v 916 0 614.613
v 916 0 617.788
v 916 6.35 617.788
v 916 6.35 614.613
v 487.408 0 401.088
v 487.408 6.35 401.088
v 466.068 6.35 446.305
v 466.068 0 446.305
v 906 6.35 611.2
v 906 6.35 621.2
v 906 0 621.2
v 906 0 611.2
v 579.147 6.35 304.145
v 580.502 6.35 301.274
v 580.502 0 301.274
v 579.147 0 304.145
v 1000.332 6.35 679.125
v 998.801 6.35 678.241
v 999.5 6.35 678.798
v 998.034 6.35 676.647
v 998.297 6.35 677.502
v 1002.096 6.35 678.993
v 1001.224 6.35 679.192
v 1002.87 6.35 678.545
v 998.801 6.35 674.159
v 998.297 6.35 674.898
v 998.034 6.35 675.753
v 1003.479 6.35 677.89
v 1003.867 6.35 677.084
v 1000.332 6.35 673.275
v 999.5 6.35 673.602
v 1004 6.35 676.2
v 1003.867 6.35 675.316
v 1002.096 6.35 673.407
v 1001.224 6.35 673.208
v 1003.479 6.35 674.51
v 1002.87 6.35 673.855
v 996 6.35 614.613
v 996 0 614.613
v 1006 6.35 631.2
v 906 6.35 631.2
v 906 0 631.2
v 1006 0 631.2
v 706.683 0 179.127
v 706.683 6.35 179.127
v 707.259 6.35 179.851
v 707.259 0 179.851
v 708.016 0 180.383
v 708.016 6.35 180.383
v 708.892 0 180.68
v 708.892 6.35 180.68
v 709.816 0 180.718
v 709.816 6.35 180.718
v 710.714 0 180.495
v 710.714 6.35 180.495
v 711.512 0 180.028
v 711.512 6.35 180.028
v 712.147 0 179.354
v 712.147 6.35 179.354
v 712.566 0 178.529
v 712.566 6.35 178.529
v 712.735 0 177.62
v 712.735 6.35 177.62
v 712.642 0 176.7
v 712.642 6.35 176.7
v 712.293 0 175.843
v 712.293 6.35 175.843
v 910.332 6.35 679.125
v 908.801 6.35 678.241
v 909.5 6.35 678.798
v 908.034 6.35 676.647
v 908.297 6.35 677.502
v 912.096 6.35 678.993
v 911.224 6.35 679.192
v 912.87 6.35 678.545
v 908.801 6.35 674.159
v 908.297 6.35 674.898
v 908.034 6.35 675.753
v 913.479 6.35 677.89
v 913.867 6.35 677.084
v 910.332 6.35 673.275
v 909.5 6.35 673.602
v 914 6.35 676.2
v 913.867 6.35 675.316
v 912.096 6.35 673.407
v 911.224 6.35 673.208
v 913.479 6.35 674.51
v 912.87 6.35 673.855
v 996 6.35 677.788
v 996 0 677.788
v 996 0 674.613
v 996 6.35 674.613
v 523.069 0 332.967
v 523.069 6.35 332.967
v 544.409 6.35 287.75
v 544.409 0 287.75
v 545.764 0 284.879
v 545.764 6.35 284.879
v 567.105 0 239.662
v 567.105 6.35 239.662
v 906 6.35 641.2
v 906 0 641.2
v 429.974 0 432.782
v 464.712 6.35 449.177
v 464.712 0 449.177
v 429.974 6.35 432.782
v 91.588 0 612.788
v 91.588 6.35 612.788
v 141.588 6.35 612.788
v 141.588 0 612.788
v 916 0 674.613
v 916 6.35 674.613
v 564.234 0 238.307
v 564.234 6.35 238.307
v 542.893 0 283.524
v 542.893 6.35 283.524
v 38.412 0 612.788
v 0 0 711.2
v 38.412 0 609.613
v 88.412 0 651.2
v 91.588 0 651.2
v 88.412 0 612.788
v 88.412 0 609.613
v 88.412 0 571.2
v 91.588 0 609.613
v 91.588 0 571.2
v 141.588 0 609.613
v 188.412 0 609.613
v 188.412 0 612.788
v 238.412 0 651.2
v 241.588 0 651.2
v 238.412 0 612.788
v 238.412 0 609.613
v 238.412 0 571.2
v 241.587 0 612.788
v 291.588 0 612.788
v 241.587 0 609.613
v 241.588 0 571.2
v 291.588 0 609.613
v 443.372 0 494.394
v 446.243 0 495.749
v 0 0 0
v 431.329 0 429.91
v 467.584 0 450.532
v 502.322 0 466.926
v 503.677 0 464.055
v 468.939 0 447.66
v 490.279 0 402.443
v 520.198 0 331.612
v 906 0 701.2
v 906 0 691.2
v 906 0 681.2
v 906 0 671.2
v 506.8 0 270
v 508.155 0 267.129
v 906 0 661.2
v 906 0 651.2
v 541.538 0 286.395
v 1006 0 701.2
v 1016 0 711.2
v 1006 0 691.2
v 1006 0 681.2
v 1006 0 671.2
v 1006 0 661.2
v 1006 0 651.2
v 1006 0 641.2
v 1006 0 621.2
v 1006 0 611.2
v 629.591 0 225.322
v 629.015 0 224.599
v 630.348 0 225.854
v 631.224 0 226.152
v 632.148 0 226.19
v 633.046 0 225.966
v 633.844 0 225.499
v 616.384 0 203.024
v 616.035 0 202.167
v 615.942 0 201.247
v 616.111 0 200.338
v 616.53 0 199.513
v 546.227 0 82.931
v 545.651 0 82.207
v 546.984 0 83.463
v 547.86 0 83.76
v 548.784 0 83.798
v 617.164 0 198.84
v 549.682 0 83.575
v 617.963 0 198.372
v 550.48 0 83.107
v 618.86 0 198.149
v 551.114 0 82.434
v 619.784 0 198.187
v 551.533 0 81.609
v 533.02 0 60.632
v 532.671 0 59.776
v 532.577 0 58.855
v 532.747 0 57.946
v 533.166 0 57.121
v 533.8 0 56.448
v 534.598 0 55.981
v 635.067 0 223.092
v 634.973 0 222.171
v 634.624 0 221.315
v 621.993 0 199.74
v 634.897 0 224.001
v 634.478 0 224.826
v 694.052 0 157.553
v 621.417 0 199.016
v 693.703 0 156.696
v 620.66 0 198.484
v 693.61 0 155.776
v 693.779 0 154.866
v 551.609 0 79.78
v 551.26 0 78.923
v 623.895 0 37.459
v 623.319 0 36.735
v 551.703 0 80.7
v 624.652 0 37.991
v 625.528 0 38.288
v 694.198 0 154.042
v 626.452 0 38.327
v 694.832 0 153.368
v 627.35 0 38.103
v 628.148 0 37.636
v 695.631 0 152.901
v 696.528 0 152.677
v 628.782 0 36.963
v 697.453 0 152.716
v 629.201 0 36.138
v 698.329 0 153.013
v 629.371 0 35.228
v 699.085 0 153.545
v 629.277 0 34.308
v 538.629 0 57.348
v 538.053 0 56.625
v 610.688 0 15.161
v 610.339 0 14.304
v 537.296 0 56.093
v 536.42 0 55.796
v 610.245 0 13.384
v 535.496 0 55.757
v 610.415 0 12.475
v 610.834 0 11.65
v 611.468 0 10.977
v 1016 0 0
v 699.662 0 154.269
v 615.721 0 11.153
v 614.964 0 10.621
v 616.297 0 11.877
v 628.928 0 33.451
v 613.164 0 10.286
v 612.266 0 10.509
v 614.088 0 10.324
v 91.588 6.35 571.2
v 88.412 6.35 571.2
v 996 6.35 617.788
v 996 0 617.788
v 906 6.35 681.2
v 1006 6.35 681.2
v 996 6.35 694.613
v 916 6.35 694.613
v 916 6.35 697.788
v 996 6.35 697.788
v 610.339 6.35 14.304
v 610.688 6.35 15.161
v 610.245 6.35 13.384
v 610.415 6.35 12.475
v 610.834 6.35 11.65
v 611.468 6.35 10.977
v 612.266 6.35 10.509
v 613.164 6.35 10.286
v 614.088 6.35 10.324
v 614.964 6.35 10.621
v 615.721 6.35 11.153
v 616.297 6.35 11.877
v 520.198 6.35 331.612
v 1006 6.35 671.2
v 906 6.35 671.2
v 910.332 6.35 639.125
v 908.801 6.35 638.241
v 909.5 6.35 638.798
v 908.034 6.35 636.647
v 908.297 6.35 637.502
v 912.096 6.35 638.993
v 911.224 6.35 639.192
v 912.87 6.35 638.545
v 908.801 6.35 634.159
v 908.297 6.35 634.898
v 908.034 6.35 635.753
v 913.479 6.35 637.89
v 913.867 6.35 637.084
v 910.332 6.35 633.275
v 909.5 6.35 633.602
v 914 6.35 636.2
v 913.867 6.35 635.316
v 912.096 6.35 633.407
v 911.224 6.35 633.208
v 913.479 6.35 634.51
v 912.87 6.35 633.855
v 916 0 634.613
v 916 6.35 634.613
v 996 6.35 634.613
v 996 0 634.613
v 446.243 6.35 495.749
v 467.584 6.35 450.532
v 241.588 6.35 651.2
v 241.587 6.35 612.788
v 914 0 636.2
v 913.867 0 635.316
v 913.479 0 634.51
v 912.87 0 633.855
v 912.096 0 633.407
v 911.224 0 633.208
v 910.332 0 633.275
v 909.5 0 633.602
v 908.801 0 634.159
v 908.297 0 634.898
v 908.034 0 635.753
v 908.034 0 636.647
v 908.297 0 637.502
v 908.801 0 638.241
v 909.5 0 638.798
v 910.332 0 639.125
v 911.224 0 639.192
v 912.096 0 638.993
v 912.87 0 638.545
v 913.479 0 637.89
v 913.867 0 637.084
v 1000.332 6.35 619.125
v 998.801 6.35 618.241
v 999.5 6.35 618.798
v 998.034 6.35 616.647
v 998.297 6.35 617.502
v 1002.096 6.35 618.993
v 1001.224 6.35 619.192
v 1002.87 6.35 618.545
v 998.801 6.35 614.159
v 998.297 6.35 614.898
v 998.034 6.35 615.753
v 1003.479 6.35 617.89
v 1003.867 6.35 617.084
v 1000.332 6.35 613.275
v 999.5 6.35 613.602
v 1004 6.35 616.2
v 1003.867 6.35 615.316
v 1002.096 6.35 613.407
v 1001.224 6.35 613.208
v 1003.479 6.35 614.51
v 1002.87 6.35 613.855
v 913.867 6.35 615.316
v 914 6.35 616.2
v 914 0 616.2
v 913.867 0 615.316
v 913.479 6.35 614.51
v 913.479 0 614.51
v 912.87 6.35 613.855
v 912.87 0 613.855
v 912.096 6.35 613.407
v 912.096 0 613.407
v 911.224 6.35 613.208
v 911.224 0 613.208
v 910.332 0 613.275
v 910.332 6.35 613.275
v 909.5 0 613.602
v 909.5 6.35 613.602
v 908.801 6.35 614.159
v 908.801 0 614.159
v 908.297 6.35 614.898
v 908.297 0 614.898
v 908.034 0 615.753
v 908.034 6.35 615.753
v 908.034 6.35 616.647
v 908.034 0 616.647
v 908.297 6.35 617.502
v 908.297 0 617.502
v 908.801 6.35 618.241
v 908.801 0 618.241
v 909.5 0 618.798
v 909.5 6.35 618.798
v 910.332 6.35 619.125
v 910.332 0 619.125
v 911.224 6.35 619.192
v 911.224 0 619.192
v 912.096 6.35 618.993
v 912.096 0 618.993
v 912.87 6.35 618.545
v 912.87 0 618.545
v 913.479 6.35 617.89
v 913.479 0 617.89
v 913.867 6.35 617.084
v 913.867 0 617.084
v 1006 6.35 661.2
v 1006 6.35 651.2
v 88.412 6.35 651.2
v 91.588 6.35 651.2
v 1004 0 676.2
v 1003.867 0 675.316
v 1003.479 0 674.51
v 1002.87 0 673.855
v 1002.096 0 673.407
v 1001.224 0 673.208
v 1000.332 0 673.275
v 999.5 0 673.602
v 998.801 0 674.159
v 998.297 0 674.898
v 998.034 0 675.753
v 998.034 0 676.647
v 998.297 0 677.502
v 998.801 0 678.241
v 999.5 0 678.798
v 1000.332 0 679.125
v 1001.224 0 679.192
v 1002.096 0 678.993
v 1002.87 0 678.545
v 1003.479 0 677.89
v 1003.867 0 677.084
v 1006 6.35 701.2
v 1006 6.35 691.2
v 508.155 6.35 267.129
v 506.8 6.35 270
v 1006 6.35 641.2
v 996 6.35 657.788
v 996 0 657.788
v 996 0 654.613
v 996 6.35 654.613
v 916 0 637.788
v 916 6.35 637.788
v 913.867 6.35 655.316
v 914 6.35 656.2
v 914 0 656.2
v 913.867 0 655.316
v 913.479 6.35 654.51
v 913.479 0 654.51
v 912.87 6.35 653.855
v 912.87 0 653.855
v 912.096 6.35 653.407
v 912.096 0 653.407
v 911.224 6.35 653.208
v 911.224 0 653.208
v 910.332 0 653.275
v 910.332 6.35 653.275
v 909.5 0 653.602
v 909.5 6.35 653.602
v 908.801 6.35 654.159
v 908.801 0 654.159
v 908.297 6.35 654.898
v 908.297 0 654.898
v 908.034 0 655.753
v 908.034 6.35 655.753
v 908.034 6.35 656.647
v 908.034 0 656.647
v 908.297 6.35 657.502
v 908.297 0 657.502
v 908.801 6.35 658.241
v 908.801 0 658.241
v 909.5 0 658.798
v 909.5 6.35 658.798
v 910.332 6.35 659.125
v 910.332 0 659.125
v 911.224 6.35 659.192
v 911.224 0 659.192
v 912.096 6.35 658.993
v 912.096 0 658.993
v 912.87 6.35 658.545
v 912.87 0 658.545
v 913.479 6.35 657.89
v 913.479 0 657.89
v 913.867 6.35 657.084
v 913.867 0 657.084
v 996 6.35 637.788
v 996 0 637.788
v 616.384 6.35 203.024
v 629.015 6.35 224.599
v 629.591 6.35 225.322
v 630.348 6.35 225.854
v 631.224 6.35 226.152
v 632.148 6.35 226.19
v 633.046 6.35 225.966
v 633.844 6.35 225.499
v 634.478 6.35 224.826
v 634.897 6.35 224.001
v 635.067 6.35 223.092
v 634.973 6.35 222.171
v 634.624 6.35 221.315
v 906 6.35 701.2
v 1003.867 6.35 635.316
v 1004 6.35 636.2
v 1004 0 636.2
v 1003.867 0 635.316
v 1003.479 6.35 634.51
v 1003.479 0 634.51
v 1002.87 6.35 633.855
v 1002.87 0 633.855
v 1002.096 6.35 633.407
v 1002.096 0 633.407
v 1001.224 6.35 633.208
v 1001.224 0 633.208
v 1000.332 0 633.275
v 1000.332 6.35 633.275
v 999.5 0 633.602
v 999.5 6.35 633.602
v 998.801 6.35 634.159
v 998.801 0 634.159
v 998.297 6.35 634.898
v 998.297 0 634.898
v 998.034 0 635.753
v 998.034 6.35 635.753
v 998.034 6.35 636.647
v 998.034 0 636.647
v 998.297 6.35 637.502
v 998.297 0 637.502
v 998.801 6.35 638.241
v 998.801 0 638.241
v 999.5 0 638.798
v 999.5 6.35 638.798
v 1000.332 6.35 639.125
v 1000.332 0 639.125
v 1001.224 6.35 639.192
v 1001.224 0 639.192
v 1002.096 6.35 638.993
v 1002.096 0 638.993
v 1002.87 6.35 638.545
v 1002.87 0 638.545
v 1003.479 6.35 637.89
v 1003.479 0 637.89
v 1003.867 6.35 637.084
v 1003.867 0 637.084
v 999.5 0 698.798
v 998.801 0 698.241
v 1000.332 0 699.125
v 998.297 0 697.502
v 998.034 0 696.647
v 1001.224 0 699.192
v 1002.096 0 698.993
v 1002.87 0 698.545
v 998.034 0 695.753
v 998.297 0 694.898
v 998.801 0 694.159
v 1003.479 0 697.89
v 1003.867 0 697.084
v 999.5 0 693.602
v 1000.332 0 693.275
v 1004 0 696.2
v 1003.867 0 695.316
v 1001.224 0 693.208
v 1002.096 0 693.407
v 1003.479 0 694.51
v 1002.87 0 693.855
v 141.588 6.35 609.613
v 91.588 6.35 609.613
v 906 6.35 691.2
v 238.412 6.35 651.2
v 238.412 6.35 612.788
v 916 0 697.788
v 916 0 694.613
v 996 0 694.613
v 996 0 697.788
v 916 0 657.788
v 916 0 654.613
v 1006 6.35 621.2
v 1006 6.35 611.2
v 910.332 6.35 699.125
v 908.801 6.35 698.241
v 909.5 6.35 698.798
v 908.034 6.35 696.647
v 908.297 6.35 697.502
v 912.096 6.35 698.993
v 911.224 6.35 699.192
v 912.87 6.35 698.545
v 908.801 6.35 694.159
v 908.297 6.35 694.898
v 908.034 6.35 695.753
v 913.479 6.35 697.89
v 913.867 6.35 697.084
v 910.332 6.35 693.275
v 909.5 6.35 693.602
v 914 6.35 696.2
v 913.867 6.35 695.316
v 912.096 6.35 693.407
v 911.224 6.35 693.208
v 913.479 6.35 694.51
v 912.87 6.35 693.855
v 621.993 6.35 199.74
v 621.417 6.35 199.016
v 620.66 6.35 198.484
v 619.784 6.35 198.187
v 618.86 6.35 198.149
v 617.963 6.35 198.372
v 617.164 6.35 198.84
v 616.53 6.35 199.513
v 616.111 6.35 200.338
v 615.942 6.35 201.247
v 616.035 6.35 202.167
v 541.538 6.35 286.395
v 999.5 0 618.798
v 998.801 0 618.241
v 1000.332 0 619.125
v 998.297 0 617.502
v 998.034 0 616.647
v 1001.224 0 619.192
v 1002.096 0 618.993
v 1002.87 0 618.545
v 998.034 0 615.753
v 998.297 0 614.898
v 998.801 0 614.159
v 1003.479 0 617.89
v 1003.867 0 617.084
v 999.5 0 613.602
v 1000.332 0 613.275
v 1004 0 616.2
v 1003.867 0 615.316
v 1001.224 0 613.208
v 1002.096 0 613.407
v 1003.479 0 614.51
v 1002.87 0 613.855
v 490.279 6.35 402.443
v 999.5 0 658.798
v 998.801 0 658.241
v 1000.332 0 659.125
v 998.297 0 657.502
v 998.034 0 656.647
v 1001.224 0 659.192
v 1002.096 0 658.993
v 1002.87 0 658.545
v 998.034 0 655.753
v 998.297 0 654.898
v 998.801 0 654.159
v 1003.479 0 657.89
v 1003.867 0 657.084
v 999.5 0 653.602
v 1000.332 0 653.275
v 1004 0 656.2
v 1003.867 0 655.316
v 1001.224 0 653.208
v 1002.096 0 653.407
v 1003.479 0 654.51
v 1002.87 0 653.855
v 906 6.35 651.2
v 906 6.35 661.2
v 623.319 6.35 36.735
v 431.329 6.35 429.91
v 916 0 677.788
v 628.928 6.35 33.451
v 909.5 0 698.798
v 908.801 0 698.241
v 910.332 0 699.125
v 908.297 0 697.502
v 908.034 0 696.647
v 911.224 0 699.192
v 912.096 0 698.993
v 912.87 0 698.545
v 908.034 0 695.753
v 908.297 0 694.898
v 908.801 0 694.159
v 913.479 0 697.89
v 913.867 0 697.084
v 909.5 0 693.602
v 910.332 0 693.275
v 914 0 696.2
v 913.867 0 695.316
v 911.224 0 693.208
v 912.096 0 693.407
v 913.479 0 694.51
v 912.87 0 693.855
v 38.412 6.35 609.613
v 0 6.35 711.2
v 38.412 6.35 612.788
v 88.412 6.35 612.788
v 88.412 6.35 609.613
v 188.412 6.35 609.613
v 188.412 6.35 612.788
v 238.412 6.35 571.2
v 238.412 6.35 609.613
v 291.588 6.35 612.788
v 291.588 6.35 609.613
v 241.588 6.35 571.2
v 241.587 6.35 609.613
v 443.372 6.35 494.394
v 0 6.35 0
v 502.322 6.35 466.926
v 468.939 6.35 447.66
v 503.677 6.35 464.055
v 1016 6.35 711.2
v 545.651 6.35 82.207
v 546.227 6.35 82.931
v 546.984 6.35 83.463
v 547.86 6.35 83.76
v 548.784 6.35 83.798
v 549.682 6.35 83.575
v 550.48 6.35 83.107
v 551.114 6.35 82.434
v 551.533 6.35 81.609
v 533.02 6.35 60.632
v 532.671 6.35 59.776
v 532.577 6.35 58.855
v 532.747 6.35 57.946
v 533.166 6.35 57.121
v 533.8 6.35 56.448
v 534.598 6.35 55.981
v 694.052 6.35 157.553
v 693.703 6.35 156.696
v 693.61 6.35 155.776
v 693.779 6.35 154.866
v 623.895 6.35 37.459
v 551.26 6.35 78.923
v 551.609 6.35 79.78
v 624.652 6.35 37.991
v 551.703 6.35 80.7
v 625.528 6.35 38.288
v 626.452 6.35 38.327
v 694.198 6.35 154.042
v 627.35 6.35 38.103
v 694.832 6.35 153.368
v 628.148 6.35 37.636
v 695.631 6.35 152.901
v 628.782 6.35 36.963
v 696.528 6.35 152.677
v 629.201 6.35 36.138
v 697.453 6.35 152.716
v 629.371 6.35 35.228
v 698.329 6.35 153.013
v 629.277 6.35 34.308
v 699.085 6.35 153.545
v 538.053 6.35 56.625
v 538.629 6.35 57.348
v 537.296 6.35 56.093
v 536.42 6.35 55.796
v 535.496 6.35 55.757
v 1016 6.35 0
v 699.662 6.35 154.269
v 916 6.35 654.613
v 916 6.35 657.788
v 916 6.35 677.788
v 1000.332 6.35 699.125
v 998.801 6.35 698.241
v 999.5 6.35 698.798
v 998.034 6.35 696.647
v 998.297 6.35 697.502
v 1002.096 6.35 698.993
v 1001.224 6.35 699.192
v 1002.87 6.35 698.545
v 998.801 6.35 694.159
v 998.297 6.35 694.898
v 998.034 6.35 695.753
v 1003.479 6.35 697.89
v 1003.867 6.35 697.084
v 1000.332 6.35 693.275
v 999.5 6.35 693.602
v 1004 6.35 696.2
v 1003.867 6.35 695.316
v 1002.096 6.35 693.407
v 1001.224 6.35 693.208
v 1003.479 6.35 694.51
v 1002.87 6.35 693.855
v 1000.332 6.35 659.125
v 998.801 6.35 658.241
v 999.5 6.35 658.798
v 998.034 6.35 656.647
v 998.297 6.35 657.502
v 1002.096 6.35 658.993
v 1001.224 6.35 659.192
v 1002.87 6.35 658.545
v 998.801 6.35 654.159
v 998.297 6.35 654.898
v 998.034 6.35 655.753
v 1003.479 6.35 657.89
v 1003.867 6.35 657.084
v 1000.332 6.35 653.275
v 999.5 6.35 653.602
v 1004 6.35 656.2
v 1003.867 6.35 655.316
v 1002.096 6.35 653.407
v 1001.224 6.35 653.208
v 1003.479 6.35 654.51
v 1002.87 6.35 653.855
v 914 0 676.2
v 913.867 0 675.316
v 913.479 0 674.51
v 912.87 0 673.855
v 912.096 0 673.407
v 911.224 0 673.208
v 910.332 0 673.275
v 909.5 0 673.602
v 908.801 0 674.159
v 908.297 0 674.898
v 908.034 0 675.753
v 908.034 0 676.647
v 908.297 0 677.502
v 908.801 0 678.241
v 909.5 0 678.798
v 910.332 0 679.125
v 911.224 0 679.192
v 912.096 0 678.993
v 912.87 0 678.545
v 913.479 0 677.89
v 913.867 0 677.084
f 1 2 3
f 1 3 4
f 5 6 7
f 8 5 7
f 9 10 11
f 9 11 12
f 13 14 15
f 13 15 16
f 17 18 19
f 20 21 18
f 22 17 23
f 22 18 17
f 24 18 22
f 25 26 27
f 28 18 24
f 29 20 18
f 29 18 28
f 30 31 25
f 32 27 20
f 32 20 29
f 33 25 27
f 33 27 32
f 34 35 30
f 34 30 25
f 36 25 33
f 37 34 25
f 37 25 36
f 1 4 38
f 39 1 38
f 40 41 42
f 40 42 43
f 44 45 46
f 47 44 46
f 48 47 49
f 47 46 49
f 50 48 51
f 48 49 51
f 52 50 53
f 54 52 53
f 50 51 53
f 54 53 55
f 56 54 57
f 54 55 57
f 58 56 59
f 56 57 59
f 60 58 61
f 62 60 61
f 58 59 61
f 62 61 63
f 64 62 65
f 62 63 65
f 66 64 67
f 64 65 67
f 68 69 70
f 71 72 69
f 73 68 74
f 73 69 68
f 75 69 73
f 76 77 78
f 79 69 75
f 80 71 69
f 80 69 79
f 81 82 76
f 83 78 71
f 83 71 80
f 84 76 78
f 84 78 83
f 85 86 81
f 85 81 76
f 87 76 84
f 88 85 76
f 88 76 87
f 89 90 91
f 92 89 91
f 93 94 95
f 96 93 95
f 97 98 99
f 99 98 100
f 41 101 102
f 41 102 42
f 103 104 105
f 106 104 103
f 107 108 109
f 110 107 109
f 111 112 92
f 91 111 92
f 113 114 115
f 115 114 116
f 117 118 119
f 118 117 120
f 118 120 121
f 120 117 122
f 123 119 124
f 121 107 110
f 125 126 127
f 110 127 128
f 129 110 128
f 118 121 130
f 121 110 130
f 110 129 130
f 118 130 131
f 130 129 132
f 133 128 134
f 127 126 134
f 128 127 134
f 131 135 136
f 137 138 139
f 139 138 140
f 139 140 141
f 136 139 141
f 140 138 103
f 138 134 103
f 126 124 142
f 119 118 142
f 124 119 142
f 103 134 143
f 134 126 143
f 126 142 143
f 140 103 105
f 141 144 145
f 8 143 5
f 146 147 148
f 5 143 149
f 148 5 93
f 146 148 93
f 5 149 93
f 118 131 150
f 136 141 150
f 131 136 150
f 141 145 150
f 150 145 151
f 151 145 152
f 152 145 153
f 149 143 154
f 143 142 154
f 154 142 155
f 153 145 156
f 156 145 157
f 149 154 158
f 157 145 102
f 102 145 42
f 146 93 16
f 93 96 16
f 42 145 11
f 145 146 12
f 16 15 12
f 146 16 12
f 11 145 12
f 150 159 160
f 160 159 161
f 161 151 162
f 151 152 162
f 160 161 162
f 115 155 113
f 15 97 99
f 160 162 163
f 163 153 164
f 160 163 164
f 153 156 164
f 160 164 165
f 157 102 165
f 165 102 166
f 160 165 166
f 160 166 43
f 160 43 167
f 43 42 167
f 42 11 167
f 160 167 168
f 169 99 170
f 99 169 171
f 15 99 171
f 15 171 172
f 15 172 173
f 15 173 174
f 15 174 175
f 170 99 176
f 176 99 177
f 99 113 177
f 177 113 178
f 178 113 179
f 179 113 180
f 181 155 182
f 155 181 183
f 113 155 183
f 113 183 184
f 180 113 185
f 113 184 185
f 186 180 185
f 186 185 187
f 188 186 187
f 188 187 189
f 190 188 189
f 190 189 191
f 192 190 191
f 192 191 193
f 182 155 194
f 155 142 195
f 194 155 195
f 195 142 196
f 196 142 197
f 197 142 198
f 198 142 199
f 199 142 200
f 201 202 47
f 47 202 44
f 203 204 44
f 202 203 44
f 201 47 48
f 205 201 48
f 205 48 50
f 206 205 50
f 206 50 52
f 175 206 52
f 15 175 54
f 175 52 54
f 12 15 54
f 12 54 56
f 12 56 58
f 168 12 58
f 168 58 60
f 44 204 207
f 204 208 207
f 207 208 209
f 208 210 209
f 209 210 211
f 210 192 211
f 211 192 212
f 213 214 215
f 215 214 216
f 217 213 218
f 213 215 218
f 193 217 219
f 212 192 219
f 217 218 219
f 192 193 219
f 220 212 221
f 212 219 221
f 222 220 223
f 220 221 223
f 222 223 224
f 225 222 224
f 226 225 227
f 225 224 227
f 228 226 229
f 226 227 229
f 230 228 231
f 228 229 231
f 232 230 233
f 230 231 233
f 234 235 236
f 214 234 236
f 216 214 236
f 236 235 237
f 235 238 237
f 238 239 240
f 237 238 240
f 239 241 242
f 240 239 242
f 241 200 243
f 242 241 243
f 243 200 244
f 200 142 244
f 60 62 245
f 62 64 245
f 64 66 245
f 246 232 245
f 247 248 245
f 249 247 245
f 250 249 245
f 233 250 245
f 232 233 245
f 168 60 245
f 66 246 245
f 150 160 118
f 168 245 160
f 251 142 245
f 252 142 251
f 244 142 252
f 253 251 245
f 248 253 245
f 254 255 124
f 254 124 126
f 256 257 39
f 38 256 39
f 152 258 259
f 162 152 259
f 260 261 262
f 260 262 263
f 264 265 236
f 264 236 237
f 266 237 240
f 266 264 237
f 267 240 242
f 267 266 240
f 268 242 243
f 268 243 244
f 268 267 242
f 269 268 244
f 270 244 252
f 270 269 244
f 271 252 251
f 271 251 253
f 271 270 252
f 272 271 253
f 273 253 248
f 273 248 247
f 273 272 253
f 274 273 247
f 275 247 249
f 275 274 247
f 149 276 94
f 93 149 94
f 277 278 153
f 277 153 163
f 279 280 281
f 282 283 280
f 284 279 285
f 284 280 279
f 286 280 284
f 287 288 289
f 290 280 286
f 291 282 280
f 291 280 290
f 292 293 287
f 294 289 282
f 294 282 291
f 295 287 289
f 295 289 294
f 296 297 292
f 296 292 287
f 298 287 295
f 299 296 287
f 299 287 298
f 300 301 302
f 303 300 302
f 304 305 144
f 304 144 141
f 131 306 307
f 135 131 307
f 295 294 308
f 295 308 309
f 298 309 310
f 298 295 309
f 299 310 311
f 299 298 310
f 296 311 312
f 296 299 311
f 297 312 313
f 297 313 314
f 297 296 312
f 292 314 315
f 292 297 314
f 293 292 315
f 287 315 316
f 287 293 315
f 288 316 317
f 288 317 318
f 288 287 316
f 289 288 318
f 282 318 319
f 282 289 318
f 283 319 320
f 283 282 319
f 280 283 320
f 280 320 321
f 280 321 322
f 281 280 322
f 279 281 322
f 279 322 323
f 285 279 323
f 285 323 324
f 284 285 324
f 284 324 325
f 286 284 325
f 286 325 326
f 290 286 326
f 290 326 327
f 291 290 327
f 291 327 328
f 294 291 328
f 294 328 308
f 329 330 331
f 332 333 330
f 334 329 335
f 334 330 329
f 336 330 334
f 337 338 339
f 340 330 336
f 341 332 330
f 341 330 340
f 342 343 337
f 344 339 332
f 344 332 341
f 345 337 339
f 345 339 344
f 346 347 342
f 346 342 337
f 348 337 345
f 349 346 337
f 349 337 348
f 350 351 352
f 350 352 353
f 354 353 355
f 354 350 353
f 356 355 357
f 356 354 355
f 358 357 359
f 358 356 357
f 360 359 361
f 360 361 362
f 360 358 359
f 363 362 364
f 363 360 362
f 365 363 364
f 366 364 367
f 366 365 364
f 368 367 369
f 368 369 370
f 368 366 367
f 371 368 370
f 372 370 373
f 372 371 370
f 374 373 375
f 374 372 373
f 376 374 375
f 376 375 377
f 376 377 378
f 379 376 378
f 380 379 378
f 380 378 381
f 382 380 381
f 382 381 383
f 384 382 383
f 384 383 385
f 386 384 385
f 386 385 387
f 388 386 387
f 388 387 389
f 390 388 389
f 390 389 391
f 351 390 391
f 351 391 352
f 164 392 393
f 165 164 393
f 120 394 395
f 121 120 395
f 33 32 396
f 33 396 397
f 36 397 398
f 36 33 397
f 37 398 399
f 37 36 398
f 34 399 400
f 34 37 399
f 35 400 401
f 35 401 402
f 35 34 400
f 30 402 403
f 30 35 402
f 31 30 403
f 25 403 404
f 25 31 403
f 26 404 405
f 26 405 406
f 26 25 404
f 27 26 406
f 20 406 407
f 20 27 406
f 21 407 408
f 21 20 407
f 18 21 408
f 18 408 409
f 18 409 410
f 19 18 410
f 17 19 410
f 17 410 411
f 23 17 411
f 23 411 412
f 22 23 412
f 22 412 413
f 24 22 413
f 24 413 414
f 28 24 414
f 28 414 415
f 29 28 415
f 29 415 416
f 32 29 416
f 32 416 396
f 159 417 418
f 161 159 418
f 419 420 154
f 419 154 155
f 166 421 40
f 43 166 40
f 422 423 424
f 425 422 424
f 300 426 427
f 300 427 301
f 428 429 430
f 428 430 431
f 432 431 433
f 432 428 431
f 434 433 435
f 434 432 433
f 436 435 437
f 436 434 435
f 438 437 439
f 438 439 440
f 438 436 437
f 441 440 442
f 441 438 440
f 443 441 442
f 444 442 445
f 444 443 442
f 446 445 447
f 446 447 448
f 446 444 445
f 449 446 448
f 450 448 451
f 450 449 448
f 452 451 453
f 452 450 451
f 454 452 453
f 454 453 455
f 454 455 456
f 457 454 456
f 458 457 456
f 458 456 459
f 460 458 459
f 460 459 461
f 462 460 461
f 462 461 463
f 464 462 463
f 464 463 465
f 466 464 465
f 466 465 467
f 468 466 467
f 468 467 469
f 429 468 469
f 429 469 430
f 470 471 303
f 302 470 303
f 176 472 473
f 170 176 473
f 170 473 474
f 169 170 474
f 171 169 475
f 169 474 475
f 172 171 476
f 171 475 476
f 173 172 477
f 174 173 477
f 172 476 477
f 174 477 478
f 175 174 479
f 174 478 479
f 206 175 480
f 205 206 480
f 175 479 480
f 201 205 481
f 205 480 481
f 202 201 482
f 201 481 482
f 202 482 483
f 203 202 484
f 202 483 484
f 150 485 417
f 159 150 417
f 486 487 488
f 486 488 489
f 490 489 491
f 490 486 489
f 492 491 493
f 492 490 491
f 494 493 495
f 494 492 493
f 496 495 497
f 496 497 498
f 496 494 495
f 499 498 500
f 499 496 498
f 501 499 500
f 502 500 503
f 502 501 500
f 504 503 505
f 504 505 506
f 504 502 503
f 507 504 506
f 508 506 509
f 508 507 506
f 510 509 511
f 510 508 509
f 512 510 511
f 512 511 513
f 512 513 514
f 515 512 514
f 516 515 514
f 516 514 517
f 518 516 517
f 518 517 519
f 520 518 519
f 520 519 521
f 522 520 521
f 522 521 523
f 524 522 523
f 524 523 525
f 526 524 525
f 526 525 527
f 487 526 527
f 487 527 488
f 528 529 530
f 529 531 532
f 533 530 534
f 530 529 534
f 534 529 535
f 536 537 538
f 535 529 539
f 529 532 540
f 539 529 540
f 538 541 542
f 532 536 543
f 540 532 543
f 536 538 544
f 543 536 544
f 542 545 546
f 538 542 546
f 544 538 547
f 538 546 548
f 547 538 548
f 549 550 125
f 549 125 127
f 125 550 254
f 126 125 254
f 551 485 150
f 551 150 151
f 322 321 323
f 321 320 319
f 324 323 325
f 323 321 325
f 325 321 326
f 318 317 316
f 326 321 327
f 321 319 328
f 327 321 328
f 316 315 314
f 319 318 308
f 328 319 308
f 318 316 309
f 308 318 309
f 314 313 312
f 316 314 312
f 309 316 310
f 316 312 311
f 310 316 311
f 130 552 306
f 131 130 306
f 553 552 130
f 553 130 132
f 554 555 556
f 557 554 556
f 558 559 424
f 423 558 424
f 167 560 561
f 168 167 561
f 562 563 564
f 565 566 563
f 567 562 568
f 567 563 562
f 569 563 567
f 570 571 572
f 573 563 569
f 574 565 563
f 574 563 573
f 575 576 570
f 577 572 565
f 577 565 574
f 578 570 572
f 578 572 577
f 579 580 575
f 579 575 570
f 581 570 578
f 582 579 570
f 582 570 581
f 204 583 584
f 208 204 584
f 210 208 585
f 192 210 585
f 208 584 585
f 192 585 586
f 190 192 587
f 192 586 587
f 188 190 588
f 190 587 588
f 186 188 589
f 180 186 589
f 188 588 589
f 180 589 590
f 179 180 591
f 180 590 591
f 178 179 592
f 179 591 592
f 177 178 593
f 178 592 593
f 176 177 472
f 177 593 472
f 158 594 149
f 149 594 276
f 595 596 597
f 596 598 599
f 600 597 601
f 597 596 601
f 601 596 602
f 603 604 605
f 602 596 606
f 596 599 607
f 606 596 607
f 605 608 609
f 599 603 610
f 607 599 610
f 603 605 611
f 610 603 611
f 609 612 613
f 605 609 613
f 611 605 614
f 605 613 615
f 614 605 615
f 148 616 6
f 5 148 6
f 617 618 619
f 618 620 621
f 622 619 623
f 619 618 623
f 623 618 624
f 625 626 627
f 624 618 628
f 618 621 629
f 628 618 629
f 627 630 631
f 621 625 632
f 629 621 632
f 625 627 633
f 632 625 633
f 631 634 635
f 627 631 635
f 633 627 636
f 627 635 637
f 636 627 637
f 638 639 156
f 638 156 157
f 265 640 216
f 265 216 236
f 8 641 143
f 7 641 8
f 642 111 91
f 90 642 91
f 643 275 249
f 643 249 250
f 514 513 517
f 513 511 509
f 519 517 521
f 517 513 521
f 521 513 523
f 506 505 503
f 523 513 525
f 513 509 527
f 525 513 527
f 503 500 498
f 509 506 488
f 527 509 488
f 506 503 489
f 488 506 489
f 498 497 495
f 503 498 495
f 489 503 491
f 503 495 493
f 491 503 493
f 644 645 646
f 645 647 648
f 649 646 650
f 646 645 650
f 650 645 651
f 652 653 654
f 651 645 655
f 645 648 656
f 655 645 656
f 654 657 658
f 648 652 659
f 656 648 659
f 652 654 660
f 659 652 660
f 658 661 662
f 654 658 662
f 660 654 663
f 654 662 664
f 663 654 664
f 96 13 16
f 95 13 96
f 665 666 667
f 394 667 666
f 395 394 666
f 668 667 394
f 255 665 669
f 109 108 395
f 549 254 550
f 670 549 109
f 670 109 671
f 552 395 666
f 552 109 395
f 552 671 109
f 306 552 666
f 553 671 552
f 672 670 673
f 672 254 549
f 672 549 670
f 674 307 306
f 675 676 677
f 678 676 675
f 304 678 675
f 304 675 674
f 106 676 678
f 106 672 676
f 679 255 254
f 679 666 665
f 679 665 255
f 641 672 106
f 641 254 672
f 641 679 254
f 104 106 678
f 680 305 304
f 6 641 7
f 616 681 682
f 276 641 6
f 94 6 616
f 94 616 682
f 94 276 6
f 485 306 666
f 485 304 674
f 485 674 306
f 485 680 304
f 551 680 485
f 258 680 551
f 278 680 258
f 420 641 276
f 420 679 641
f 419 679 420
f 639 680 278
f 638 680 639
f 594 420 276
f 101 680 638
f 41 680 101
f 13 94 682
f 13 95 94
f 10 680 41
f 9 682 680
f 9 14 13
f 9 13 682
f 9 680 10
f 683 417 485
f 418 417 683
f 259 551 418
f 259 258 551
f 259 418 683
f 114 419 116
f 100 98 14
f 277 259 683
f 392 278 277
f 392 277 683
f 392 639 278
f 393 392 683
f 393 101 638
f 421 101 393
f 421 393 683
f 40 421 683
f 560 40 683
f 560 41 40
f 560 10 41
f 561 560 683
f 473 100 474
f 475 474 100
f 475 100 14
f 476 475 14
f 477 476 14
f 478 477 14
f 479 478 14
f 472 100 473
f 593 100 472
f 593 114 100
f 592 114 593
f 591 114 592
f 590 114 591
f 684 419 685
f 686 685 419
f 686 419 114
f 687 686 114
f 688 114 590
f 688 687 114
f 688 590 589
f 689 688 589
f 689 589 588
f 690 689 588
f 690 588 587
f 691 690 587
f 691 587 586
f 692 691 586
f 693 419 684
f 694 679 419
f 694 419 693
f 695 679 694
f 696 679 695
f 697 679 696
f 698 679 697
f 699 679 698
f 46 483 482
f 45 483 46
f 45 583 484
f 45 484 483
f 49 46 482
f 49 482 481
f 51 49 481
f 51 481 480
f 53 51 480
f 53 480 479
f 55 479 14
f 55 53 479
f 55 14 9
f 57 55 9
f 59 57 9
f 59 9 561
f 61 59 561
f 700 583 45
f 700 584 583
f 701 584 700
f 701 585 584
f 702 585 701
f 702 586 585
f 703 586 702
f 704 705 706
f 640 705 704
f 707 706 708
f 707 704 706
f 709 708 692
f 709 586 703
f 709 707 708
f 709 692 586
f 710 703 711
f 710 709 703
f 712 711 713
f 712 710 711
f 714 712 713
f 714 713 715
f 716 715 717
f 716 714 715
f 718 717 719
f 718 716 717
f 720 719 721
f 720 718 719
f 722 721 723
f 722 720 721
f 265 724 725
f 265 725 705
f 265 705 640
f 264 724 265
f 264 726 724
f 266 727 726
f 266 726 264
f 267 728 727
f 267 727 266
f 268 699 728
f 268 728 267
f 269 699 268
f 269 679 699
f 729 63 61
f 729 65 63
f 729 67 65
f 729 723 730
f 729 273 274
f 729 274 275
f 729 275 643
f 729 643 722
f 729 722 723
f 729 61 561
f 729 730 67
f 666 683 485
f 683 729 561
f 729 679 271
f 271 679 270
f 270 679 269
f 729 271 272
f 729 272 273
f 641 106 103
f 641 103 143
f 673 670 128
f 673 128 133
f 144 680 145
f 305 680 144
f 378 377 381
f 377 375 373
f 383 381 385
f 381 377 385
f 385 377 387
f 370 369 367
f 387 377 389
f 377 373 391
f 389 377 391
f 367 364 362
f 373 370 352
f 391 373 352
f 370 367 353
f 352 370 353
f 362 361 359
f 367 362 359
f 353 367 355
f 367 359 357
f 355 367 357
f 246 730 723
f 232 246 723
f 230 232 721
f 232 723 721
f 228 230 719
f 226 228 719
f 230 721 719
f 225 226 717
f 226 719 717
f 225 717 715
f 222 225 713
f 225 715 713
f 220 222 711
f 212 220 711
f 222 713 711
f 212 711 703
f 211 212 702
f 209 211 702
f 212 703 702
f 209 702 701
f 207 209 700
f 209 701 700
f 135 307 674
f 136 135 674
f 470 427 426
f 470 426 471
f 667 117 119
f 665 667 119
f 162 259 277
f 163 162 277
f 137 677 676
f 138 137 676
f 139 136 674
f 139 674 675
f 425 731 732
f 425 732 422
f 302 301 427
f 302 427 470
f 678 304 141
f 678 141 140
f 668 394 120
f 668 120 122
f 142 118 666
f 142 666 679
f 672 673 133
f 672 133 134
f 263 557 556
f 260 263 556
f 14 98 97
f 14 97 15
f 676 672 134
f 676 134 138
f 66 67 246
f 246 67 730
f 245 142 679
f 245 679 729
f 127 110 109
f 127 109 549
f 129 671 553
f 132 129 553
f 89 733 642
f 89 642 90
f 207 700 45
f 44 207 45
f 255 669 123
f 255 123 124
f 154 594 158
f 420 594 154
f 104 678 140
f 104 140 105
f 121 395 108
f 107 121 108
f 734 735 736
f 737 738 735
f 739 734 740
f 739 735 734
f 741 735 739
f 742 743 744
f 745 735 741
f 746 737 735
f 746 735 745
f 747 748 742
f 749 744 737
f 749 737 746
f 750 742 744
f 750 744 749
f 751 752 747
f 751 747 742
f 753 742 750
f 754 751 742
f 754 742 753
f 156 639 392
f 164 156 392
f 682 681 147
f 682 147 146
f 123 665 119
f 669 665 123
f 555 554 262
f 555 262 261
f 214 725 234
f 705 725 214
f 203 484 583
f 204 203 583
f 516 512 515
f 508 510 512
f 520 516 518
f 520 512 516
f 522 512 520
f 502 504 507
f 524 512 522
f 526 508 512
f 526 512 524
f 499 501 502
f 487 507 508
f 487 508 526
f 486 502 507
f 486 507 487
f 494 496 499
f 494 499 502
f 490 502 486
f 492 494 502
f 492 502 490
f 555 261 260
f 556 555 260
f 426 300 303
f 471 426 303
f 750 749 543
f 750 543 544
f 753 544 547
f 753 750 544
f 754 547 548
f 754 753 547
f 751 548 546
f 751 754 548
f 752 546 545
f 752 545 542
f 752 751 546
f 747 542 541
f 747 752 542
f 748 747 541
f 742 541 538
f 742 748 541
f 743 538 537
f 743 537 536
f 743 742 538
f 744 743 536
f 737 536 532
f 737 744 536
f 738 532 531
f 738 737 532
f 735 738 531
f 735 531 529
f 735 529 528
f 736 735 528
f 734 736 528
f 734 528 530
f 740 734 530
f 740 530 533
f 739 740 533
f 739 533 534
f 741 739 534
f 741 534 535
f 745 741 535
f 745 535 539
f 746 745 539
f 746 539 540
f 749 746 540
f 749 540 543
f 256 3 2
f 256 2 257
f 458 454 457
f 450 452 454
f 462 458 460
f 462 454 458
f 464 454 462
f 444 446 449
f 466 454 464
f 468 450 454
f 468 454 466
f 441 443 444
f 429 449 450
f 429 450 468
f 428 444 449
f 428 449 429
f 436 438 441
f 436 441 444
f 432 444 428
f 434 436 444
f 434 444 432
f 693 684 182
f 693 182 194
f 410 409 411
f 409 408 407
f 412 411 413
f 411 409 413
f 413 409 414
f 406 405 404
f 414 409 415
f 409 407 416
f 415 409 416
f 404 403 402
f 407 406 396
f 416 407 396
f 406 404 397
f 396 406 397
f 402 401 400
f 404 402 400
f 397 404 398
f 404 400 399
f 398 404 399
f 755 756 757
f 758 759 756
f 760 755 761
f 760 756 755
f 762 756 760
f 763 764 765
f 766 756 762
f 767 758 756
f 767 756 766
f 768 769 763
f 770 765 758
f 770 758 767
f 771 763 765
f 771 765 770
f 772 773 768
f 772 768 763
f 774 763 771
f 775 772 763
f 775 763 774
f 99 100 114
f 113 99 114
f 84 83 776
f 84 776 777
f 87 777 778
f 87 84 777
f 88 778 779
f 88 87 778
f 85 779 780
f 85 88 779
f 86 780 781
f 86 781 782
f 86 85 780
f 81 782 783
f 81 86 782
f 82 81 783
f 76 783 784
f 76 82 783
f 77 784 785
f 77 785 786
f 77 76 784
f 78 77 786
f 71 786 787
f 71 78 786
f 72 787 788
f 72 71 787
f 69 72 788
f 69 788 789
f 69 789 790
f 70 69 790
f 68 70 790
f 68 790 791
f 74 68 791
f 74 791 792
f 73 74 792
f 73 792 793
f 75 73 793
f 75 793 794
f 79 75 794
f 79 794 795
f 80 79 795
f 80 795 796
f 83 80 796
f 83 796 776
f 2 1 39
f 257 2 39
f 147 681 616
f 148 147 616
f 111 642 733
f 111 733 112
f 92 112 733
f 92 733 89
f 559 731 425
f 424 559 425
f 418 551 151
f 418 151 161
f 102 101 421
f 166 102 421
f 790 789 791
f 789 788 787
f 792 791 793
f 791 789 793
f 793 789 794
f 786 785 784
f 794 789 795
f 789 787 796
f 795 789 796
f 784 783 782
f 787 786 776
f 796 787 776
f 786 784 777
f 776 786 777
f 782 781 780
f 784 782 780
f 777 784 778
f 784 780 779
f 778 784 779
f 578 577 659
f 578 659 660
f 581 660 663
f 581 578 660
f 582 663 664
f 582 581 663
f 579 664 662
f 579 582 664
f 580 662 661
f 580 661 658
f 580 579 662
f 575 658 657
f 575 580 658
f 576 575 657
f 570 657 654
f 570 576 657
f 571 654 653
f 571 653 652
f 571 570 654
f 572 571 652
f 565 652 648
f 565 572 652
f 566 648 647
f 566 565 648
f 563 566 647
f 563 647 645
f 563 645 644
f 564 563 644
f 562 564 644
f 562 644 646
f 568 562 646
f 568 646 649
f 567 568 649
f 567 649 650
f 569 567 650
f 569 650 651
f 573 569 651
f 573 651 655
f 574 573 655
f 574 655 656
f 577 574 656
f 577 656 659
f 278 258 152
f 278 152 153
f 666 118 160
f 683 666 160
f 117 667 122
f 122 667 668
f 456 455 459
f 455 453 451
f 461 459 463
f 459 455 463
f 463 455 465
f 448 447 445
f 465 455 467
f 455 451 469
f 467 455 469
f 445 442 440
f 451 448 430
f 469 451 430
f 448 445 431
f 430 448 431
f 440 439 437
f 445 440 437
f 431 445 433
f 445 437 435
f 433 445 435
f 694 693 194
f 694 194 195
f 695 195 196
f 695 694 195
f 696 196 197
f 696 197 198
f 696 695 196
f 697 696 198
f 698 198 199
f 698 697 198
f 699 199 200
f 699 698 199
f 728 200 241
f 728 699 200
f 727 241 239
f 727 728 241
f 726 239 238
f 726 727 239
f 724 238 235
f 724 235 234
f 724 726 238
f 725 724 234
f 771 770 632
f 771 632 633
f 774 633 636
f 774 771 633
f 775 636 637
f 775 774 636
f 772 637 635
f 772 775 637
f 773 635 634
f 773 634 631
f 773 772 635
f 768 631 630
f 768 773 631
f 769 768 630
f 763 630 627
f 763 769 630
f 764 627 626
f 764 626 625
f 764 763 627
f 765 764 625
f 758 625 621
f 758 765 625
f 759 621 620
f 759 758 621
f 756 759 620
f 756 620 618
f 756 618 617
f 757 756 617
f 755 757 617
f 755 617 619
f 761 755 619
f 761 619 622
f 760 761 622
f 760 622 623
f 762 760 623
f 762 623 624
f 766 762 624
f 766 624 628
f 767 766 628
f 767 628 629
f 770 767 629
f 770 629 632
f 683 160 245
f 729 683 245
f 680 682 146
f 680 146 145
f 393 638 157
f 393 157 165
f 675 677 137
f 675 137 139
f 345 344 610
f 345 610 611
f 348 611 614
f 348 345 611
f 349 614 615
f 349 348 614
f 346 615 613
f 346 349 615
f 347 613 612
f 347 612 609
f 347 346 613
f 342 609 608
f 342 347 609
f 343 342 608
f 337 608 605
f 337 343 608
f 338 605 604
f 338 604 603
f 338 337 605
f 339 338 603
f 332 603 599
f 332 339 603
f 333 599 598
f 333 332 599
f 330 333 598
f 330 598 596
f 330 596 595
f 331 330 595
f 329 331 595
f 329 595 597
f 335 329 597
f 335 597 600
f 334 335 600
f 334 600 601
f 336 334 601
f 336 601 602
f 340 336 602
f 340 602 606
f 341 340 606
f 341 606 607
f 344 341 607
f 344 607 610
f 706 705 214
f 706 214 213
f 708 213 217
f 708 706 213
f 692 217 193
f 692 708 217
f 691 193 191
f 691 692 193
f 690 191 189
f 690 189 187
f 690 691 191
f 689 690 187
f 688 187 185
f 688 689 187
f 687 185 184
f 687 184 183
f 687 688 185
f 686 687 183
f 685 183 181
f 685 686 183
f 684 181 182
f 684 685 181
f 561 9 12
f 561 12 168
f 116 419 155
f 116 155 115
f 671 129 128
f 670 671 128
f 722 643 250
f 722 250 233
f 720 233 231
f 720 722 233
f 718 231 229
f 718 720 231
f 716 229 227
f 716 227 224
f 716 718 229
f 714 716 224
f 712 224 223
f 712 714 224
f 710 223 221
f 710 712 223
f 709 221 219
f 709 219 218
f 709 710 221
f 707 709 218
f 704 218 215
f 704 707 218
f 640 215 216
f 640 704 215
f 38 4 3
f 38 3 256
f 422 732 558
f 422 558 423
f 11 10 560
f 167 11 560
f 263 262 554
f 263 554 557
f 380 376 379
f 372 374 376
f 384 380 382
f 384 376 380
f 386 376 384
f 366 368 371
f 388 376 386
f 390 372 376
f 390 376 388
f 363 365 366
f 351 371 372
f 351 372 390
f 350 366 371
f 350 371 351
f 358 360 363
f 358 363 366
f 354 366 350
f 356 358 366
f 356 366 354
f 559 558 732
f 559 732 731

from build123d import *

# Parameters (mm, degrees)
SKETCH1_W           = 1016
SKETCH1_H           = 711.2
BOSS_EXTRUDE1_DEPTH = 6.35
SKETCH2_W           = 3.175
SKETCH2_H           = 80
CUT_EXTRUDE1_DEPTH  = 6.35
SKETCH4_W           = 50
SKETCH4_H           = 3.175
CUT_EXTRUDE2_DEPTH  = 10
SKETCH5_W           = 100
SKETCH5_H           = 10
SKETCH5_R           = 3
SKETCH5_W_2         = 80
SKETCH5_H_2         = 3.175
CUT_EXTRUDE3_DEPTH  = 10


with BuildPart() as part:
    # Sketch1 → Boss-Extrude1 (new body)
    with BuildSketch(Plane(origin=(0, 0, 0), x_dir=(1, 0, 0), z_dir=(0, 1, 0))):
        with Locations((508, -355.6)):
            Rectangle(SKETCH1_W, SKETCH1_H)
    extrude(amount=BOSS_EXTRUDE1_DEPTH)

    # Sketch2 → Cut-Extrude1 (cut)
    with BuildSketch(Plane(origin=(0, 6.35, 0), x_dir=(1, 0, 0), z_dir=(0, 1, 0))):
        Polygon((431.329491407, -429.910471079), (503.676837849, -464.055184621), (502.32171953, -466.926469933), (429.974373088, -432.781756391), align=None)
        with Locations((90, -611.2)):
            Rectangle(SKETCH2_W, SKETCH2_H)
        with Locations((240, -611.2)):
            Rectangle(SKETCH2_W, SKETCH2_H)
        Polygon((508.155096876, -267.128941585), (580.502443318, -301.273655127), (579.147324999, -304.144940439), (506.799978557, -270.000226897), align=None)
        with BuildLine():
            Line((538.629064713, -57.34841943), (551.260028142, -78.92291277))
            ThreePointArc((551.260028142, -78.92291277), (550.097369254, -83.369622149), (545.650659874, -82.206963261))
            Line((545.650659874, -82.206963261), (533.019696445, -60.632469921))
            ThreePointArc((533.019696445, -60.632469921), (534.182355333, -56.185760542), (538.629064713, -57.34841943))
        make_face()
        with BuildLine():
            Line((616.297240736, -11.876951086), (628.928204164, -33.451444426))
            ThreePointArc((628.928204164, -33.451444426), (627.765545276, -37.898153806), (623.318835896, -36.735494917))
            Line((623.318835896, -36.735494917), (610.687872467, -15.161001578))
            ThreePointArc((610.687872467, -15.161001578), (611.850531356, -10.714292198), (616.297240736, -11.876951086))
        make_face()
        with BuildLine():
            Line((712.292562795, -175.843100467), (699.661599366, -154.268607128))
            ThreePointArc((699.661599366, -154.268607128), (695.214889986, -153.105948239), (694.052231097, -157.552657619))
            Line((694.052231097, -157.552657619), (706.683194526, -179.127150959))
            ThreePointArc((706.683194526, -179.127150959), (711.129903906, -180.289809847), (712.292562795, -175.843100467))
        make_face()
        with BuildLine():
            Line((634.624386772, -221.314568811), (621.993423343, -199.740075471))
            ThreePointArc((621.993423343, -199.740075471), (617.546713963, -198.577416583), (616.384055075, -203.024125963))
            Line((616.384055075, -203.024125963), (629.015018504, -224.598619302))
            ThreePointArc((629.015018504, -224.598619302), (633.461727884, -225.761278191), (634.624386772, -221.314568811))
        make_face()
    extrude(amount=-CUT_EXTRUDE1_DEPTH, mode=Mode.SUBTRACT)

    # Sketch4 → Cut-Extrude2 (cut)
    with BuildSketch(Plane(origin=(0, 6.35, 0), x_dir=(1, 0, 0), z_dir=(0, 1, 0))):
        Polygon((467.583688965, -450.531672321), (446.243243002, -495.748763847), (443.37195769, -494.393645529), (464.712403653, -449.176554003), align=None)
        with Locations((63.4125, -611.2)):
            Rectangle(SKETCH4_W, SKETCH4_H)
        with Locations((116.5875, -611.2)):
            Rectangle(SKETCH4_W, SKETCH4_H)
        with Locations((213.4125, -611.2)):
            Rectangle(SKETCH4_W, SKETCH4_H)
        with Locations((266.5875, -611.2)):
            Rectangle(SKETCH4_W, SKETCH4_H)
        Polygon((487.407967936, -401.088177165), (466.067521972, -446.305268691), (468.938807284, -447.660387009), (490.279253247, -402.443295483), align=None)
        Polygon((541.538009122, -286.395024509), (520.197563159, -331.612116035), (523.06884847, -332.967234354), (544.409294434, -287.750142828), align=None)
        Polygon((564.233573404, -238.306647671), (542.893127441, -283.523739197), (545.764412753, -284.878857516), (567.104858716, -239.66176599), align=None)
    extrude(amount=-CUT_EXTRUDE2_DEPTH, mode=Mode.SUBTRACT)

    # Sketch5 → Cut-Extrude3 (cut)
    with BuildSketch(Plane(origin=(0, 6.35, 0), x_dir=(1, 0, 0), z_dir=(0, 1, 0))):
        with Locations((956, -696.2)):
            Rectangle(SKETCH5_W, SKETCH5_H)
        with Locations((911, -696.2)):
            Circle(SKETCH5_R, mode=Mode.SUBTRACT)
        with Locations((1001, -696.2)):
            Circle(SKETCH5_R, mode=Mode.SUBTRACT)
        with Locations((956, -696.2)):
            Rectangle(SKETCH5_W_2, SKETCH5_H_2, mode=Mode.SUBTRACT)
        with Locations((956, -676.2)):
            Rectangle(SKETCH5_W, SKETCH5_H)
        with Locations((911, -676.2)):
            Circle(SKETCH5_R, mode=Mode.SUBTRACT)
        with Locations((1001, -676.2)):
            Circle(SKETCH5_R, mode=Mode.SUBTRACT)
        with Locations((956, -676.2)):
            Rectangle(SKETCH5_W_2, SKETCH5_H_2, mode=Mode.SUBTRACT)
        with Locations((956, -656.2)):
            Rectangle(SKETCH5_W, SKETCH5_H)
        with Locations((911, -656.2)):
            Circle(SKETCH5_R, mode=Mode.SUBTRACT)
        with Locations((1001, -656.2)):
            Circle(SKETCH5_R, mode=Mode.SUBTRACT)
        with Locations((956, -656.2)):
            Rectangle(SKETCH5_W_2, SKETCH5_H_2, mode=Mode.SUBTRACT)
        with Locations((956, -616.2)):
            Rectangle(SKETCH5_W, SKETCH5_H)
        with Locations((911, -616.2)):
            Circle(SKETCH5_R, mode=Mode.SUBTRACT)
        with Locations((1001, -616.2)):
            Circle(SKETCH5_R, mode=Mode.SUBTRACT)
        with Locations((956, -616.2)):
            Rectangle(SKETCH5_W_2, SKETCH5_H_2, mode=Mode.SUBTRACT)
        with Locations((956, -636.2)):
            Rectangle(SKETCH5_W, SKETCH5_H)
        with Locations((911, -636.2)):
            Circle(SKETCH5_R, mode=Mode.SUBTRACT)
        with Locations((1001, -636.2)):
            Circle(SKETCH5_R, mode=Mode.SUBTRACT)
        with Locations((956, -636.2)):
            Rectangle(SKETCH5_W_2, SKETCH5_H_2, mode=Mode.SUBTRACT)
    extrude(amount=-CUT_EXTRUDE3_DEPTH, mode=Mode.SUBTRACT)


solid = part.part
